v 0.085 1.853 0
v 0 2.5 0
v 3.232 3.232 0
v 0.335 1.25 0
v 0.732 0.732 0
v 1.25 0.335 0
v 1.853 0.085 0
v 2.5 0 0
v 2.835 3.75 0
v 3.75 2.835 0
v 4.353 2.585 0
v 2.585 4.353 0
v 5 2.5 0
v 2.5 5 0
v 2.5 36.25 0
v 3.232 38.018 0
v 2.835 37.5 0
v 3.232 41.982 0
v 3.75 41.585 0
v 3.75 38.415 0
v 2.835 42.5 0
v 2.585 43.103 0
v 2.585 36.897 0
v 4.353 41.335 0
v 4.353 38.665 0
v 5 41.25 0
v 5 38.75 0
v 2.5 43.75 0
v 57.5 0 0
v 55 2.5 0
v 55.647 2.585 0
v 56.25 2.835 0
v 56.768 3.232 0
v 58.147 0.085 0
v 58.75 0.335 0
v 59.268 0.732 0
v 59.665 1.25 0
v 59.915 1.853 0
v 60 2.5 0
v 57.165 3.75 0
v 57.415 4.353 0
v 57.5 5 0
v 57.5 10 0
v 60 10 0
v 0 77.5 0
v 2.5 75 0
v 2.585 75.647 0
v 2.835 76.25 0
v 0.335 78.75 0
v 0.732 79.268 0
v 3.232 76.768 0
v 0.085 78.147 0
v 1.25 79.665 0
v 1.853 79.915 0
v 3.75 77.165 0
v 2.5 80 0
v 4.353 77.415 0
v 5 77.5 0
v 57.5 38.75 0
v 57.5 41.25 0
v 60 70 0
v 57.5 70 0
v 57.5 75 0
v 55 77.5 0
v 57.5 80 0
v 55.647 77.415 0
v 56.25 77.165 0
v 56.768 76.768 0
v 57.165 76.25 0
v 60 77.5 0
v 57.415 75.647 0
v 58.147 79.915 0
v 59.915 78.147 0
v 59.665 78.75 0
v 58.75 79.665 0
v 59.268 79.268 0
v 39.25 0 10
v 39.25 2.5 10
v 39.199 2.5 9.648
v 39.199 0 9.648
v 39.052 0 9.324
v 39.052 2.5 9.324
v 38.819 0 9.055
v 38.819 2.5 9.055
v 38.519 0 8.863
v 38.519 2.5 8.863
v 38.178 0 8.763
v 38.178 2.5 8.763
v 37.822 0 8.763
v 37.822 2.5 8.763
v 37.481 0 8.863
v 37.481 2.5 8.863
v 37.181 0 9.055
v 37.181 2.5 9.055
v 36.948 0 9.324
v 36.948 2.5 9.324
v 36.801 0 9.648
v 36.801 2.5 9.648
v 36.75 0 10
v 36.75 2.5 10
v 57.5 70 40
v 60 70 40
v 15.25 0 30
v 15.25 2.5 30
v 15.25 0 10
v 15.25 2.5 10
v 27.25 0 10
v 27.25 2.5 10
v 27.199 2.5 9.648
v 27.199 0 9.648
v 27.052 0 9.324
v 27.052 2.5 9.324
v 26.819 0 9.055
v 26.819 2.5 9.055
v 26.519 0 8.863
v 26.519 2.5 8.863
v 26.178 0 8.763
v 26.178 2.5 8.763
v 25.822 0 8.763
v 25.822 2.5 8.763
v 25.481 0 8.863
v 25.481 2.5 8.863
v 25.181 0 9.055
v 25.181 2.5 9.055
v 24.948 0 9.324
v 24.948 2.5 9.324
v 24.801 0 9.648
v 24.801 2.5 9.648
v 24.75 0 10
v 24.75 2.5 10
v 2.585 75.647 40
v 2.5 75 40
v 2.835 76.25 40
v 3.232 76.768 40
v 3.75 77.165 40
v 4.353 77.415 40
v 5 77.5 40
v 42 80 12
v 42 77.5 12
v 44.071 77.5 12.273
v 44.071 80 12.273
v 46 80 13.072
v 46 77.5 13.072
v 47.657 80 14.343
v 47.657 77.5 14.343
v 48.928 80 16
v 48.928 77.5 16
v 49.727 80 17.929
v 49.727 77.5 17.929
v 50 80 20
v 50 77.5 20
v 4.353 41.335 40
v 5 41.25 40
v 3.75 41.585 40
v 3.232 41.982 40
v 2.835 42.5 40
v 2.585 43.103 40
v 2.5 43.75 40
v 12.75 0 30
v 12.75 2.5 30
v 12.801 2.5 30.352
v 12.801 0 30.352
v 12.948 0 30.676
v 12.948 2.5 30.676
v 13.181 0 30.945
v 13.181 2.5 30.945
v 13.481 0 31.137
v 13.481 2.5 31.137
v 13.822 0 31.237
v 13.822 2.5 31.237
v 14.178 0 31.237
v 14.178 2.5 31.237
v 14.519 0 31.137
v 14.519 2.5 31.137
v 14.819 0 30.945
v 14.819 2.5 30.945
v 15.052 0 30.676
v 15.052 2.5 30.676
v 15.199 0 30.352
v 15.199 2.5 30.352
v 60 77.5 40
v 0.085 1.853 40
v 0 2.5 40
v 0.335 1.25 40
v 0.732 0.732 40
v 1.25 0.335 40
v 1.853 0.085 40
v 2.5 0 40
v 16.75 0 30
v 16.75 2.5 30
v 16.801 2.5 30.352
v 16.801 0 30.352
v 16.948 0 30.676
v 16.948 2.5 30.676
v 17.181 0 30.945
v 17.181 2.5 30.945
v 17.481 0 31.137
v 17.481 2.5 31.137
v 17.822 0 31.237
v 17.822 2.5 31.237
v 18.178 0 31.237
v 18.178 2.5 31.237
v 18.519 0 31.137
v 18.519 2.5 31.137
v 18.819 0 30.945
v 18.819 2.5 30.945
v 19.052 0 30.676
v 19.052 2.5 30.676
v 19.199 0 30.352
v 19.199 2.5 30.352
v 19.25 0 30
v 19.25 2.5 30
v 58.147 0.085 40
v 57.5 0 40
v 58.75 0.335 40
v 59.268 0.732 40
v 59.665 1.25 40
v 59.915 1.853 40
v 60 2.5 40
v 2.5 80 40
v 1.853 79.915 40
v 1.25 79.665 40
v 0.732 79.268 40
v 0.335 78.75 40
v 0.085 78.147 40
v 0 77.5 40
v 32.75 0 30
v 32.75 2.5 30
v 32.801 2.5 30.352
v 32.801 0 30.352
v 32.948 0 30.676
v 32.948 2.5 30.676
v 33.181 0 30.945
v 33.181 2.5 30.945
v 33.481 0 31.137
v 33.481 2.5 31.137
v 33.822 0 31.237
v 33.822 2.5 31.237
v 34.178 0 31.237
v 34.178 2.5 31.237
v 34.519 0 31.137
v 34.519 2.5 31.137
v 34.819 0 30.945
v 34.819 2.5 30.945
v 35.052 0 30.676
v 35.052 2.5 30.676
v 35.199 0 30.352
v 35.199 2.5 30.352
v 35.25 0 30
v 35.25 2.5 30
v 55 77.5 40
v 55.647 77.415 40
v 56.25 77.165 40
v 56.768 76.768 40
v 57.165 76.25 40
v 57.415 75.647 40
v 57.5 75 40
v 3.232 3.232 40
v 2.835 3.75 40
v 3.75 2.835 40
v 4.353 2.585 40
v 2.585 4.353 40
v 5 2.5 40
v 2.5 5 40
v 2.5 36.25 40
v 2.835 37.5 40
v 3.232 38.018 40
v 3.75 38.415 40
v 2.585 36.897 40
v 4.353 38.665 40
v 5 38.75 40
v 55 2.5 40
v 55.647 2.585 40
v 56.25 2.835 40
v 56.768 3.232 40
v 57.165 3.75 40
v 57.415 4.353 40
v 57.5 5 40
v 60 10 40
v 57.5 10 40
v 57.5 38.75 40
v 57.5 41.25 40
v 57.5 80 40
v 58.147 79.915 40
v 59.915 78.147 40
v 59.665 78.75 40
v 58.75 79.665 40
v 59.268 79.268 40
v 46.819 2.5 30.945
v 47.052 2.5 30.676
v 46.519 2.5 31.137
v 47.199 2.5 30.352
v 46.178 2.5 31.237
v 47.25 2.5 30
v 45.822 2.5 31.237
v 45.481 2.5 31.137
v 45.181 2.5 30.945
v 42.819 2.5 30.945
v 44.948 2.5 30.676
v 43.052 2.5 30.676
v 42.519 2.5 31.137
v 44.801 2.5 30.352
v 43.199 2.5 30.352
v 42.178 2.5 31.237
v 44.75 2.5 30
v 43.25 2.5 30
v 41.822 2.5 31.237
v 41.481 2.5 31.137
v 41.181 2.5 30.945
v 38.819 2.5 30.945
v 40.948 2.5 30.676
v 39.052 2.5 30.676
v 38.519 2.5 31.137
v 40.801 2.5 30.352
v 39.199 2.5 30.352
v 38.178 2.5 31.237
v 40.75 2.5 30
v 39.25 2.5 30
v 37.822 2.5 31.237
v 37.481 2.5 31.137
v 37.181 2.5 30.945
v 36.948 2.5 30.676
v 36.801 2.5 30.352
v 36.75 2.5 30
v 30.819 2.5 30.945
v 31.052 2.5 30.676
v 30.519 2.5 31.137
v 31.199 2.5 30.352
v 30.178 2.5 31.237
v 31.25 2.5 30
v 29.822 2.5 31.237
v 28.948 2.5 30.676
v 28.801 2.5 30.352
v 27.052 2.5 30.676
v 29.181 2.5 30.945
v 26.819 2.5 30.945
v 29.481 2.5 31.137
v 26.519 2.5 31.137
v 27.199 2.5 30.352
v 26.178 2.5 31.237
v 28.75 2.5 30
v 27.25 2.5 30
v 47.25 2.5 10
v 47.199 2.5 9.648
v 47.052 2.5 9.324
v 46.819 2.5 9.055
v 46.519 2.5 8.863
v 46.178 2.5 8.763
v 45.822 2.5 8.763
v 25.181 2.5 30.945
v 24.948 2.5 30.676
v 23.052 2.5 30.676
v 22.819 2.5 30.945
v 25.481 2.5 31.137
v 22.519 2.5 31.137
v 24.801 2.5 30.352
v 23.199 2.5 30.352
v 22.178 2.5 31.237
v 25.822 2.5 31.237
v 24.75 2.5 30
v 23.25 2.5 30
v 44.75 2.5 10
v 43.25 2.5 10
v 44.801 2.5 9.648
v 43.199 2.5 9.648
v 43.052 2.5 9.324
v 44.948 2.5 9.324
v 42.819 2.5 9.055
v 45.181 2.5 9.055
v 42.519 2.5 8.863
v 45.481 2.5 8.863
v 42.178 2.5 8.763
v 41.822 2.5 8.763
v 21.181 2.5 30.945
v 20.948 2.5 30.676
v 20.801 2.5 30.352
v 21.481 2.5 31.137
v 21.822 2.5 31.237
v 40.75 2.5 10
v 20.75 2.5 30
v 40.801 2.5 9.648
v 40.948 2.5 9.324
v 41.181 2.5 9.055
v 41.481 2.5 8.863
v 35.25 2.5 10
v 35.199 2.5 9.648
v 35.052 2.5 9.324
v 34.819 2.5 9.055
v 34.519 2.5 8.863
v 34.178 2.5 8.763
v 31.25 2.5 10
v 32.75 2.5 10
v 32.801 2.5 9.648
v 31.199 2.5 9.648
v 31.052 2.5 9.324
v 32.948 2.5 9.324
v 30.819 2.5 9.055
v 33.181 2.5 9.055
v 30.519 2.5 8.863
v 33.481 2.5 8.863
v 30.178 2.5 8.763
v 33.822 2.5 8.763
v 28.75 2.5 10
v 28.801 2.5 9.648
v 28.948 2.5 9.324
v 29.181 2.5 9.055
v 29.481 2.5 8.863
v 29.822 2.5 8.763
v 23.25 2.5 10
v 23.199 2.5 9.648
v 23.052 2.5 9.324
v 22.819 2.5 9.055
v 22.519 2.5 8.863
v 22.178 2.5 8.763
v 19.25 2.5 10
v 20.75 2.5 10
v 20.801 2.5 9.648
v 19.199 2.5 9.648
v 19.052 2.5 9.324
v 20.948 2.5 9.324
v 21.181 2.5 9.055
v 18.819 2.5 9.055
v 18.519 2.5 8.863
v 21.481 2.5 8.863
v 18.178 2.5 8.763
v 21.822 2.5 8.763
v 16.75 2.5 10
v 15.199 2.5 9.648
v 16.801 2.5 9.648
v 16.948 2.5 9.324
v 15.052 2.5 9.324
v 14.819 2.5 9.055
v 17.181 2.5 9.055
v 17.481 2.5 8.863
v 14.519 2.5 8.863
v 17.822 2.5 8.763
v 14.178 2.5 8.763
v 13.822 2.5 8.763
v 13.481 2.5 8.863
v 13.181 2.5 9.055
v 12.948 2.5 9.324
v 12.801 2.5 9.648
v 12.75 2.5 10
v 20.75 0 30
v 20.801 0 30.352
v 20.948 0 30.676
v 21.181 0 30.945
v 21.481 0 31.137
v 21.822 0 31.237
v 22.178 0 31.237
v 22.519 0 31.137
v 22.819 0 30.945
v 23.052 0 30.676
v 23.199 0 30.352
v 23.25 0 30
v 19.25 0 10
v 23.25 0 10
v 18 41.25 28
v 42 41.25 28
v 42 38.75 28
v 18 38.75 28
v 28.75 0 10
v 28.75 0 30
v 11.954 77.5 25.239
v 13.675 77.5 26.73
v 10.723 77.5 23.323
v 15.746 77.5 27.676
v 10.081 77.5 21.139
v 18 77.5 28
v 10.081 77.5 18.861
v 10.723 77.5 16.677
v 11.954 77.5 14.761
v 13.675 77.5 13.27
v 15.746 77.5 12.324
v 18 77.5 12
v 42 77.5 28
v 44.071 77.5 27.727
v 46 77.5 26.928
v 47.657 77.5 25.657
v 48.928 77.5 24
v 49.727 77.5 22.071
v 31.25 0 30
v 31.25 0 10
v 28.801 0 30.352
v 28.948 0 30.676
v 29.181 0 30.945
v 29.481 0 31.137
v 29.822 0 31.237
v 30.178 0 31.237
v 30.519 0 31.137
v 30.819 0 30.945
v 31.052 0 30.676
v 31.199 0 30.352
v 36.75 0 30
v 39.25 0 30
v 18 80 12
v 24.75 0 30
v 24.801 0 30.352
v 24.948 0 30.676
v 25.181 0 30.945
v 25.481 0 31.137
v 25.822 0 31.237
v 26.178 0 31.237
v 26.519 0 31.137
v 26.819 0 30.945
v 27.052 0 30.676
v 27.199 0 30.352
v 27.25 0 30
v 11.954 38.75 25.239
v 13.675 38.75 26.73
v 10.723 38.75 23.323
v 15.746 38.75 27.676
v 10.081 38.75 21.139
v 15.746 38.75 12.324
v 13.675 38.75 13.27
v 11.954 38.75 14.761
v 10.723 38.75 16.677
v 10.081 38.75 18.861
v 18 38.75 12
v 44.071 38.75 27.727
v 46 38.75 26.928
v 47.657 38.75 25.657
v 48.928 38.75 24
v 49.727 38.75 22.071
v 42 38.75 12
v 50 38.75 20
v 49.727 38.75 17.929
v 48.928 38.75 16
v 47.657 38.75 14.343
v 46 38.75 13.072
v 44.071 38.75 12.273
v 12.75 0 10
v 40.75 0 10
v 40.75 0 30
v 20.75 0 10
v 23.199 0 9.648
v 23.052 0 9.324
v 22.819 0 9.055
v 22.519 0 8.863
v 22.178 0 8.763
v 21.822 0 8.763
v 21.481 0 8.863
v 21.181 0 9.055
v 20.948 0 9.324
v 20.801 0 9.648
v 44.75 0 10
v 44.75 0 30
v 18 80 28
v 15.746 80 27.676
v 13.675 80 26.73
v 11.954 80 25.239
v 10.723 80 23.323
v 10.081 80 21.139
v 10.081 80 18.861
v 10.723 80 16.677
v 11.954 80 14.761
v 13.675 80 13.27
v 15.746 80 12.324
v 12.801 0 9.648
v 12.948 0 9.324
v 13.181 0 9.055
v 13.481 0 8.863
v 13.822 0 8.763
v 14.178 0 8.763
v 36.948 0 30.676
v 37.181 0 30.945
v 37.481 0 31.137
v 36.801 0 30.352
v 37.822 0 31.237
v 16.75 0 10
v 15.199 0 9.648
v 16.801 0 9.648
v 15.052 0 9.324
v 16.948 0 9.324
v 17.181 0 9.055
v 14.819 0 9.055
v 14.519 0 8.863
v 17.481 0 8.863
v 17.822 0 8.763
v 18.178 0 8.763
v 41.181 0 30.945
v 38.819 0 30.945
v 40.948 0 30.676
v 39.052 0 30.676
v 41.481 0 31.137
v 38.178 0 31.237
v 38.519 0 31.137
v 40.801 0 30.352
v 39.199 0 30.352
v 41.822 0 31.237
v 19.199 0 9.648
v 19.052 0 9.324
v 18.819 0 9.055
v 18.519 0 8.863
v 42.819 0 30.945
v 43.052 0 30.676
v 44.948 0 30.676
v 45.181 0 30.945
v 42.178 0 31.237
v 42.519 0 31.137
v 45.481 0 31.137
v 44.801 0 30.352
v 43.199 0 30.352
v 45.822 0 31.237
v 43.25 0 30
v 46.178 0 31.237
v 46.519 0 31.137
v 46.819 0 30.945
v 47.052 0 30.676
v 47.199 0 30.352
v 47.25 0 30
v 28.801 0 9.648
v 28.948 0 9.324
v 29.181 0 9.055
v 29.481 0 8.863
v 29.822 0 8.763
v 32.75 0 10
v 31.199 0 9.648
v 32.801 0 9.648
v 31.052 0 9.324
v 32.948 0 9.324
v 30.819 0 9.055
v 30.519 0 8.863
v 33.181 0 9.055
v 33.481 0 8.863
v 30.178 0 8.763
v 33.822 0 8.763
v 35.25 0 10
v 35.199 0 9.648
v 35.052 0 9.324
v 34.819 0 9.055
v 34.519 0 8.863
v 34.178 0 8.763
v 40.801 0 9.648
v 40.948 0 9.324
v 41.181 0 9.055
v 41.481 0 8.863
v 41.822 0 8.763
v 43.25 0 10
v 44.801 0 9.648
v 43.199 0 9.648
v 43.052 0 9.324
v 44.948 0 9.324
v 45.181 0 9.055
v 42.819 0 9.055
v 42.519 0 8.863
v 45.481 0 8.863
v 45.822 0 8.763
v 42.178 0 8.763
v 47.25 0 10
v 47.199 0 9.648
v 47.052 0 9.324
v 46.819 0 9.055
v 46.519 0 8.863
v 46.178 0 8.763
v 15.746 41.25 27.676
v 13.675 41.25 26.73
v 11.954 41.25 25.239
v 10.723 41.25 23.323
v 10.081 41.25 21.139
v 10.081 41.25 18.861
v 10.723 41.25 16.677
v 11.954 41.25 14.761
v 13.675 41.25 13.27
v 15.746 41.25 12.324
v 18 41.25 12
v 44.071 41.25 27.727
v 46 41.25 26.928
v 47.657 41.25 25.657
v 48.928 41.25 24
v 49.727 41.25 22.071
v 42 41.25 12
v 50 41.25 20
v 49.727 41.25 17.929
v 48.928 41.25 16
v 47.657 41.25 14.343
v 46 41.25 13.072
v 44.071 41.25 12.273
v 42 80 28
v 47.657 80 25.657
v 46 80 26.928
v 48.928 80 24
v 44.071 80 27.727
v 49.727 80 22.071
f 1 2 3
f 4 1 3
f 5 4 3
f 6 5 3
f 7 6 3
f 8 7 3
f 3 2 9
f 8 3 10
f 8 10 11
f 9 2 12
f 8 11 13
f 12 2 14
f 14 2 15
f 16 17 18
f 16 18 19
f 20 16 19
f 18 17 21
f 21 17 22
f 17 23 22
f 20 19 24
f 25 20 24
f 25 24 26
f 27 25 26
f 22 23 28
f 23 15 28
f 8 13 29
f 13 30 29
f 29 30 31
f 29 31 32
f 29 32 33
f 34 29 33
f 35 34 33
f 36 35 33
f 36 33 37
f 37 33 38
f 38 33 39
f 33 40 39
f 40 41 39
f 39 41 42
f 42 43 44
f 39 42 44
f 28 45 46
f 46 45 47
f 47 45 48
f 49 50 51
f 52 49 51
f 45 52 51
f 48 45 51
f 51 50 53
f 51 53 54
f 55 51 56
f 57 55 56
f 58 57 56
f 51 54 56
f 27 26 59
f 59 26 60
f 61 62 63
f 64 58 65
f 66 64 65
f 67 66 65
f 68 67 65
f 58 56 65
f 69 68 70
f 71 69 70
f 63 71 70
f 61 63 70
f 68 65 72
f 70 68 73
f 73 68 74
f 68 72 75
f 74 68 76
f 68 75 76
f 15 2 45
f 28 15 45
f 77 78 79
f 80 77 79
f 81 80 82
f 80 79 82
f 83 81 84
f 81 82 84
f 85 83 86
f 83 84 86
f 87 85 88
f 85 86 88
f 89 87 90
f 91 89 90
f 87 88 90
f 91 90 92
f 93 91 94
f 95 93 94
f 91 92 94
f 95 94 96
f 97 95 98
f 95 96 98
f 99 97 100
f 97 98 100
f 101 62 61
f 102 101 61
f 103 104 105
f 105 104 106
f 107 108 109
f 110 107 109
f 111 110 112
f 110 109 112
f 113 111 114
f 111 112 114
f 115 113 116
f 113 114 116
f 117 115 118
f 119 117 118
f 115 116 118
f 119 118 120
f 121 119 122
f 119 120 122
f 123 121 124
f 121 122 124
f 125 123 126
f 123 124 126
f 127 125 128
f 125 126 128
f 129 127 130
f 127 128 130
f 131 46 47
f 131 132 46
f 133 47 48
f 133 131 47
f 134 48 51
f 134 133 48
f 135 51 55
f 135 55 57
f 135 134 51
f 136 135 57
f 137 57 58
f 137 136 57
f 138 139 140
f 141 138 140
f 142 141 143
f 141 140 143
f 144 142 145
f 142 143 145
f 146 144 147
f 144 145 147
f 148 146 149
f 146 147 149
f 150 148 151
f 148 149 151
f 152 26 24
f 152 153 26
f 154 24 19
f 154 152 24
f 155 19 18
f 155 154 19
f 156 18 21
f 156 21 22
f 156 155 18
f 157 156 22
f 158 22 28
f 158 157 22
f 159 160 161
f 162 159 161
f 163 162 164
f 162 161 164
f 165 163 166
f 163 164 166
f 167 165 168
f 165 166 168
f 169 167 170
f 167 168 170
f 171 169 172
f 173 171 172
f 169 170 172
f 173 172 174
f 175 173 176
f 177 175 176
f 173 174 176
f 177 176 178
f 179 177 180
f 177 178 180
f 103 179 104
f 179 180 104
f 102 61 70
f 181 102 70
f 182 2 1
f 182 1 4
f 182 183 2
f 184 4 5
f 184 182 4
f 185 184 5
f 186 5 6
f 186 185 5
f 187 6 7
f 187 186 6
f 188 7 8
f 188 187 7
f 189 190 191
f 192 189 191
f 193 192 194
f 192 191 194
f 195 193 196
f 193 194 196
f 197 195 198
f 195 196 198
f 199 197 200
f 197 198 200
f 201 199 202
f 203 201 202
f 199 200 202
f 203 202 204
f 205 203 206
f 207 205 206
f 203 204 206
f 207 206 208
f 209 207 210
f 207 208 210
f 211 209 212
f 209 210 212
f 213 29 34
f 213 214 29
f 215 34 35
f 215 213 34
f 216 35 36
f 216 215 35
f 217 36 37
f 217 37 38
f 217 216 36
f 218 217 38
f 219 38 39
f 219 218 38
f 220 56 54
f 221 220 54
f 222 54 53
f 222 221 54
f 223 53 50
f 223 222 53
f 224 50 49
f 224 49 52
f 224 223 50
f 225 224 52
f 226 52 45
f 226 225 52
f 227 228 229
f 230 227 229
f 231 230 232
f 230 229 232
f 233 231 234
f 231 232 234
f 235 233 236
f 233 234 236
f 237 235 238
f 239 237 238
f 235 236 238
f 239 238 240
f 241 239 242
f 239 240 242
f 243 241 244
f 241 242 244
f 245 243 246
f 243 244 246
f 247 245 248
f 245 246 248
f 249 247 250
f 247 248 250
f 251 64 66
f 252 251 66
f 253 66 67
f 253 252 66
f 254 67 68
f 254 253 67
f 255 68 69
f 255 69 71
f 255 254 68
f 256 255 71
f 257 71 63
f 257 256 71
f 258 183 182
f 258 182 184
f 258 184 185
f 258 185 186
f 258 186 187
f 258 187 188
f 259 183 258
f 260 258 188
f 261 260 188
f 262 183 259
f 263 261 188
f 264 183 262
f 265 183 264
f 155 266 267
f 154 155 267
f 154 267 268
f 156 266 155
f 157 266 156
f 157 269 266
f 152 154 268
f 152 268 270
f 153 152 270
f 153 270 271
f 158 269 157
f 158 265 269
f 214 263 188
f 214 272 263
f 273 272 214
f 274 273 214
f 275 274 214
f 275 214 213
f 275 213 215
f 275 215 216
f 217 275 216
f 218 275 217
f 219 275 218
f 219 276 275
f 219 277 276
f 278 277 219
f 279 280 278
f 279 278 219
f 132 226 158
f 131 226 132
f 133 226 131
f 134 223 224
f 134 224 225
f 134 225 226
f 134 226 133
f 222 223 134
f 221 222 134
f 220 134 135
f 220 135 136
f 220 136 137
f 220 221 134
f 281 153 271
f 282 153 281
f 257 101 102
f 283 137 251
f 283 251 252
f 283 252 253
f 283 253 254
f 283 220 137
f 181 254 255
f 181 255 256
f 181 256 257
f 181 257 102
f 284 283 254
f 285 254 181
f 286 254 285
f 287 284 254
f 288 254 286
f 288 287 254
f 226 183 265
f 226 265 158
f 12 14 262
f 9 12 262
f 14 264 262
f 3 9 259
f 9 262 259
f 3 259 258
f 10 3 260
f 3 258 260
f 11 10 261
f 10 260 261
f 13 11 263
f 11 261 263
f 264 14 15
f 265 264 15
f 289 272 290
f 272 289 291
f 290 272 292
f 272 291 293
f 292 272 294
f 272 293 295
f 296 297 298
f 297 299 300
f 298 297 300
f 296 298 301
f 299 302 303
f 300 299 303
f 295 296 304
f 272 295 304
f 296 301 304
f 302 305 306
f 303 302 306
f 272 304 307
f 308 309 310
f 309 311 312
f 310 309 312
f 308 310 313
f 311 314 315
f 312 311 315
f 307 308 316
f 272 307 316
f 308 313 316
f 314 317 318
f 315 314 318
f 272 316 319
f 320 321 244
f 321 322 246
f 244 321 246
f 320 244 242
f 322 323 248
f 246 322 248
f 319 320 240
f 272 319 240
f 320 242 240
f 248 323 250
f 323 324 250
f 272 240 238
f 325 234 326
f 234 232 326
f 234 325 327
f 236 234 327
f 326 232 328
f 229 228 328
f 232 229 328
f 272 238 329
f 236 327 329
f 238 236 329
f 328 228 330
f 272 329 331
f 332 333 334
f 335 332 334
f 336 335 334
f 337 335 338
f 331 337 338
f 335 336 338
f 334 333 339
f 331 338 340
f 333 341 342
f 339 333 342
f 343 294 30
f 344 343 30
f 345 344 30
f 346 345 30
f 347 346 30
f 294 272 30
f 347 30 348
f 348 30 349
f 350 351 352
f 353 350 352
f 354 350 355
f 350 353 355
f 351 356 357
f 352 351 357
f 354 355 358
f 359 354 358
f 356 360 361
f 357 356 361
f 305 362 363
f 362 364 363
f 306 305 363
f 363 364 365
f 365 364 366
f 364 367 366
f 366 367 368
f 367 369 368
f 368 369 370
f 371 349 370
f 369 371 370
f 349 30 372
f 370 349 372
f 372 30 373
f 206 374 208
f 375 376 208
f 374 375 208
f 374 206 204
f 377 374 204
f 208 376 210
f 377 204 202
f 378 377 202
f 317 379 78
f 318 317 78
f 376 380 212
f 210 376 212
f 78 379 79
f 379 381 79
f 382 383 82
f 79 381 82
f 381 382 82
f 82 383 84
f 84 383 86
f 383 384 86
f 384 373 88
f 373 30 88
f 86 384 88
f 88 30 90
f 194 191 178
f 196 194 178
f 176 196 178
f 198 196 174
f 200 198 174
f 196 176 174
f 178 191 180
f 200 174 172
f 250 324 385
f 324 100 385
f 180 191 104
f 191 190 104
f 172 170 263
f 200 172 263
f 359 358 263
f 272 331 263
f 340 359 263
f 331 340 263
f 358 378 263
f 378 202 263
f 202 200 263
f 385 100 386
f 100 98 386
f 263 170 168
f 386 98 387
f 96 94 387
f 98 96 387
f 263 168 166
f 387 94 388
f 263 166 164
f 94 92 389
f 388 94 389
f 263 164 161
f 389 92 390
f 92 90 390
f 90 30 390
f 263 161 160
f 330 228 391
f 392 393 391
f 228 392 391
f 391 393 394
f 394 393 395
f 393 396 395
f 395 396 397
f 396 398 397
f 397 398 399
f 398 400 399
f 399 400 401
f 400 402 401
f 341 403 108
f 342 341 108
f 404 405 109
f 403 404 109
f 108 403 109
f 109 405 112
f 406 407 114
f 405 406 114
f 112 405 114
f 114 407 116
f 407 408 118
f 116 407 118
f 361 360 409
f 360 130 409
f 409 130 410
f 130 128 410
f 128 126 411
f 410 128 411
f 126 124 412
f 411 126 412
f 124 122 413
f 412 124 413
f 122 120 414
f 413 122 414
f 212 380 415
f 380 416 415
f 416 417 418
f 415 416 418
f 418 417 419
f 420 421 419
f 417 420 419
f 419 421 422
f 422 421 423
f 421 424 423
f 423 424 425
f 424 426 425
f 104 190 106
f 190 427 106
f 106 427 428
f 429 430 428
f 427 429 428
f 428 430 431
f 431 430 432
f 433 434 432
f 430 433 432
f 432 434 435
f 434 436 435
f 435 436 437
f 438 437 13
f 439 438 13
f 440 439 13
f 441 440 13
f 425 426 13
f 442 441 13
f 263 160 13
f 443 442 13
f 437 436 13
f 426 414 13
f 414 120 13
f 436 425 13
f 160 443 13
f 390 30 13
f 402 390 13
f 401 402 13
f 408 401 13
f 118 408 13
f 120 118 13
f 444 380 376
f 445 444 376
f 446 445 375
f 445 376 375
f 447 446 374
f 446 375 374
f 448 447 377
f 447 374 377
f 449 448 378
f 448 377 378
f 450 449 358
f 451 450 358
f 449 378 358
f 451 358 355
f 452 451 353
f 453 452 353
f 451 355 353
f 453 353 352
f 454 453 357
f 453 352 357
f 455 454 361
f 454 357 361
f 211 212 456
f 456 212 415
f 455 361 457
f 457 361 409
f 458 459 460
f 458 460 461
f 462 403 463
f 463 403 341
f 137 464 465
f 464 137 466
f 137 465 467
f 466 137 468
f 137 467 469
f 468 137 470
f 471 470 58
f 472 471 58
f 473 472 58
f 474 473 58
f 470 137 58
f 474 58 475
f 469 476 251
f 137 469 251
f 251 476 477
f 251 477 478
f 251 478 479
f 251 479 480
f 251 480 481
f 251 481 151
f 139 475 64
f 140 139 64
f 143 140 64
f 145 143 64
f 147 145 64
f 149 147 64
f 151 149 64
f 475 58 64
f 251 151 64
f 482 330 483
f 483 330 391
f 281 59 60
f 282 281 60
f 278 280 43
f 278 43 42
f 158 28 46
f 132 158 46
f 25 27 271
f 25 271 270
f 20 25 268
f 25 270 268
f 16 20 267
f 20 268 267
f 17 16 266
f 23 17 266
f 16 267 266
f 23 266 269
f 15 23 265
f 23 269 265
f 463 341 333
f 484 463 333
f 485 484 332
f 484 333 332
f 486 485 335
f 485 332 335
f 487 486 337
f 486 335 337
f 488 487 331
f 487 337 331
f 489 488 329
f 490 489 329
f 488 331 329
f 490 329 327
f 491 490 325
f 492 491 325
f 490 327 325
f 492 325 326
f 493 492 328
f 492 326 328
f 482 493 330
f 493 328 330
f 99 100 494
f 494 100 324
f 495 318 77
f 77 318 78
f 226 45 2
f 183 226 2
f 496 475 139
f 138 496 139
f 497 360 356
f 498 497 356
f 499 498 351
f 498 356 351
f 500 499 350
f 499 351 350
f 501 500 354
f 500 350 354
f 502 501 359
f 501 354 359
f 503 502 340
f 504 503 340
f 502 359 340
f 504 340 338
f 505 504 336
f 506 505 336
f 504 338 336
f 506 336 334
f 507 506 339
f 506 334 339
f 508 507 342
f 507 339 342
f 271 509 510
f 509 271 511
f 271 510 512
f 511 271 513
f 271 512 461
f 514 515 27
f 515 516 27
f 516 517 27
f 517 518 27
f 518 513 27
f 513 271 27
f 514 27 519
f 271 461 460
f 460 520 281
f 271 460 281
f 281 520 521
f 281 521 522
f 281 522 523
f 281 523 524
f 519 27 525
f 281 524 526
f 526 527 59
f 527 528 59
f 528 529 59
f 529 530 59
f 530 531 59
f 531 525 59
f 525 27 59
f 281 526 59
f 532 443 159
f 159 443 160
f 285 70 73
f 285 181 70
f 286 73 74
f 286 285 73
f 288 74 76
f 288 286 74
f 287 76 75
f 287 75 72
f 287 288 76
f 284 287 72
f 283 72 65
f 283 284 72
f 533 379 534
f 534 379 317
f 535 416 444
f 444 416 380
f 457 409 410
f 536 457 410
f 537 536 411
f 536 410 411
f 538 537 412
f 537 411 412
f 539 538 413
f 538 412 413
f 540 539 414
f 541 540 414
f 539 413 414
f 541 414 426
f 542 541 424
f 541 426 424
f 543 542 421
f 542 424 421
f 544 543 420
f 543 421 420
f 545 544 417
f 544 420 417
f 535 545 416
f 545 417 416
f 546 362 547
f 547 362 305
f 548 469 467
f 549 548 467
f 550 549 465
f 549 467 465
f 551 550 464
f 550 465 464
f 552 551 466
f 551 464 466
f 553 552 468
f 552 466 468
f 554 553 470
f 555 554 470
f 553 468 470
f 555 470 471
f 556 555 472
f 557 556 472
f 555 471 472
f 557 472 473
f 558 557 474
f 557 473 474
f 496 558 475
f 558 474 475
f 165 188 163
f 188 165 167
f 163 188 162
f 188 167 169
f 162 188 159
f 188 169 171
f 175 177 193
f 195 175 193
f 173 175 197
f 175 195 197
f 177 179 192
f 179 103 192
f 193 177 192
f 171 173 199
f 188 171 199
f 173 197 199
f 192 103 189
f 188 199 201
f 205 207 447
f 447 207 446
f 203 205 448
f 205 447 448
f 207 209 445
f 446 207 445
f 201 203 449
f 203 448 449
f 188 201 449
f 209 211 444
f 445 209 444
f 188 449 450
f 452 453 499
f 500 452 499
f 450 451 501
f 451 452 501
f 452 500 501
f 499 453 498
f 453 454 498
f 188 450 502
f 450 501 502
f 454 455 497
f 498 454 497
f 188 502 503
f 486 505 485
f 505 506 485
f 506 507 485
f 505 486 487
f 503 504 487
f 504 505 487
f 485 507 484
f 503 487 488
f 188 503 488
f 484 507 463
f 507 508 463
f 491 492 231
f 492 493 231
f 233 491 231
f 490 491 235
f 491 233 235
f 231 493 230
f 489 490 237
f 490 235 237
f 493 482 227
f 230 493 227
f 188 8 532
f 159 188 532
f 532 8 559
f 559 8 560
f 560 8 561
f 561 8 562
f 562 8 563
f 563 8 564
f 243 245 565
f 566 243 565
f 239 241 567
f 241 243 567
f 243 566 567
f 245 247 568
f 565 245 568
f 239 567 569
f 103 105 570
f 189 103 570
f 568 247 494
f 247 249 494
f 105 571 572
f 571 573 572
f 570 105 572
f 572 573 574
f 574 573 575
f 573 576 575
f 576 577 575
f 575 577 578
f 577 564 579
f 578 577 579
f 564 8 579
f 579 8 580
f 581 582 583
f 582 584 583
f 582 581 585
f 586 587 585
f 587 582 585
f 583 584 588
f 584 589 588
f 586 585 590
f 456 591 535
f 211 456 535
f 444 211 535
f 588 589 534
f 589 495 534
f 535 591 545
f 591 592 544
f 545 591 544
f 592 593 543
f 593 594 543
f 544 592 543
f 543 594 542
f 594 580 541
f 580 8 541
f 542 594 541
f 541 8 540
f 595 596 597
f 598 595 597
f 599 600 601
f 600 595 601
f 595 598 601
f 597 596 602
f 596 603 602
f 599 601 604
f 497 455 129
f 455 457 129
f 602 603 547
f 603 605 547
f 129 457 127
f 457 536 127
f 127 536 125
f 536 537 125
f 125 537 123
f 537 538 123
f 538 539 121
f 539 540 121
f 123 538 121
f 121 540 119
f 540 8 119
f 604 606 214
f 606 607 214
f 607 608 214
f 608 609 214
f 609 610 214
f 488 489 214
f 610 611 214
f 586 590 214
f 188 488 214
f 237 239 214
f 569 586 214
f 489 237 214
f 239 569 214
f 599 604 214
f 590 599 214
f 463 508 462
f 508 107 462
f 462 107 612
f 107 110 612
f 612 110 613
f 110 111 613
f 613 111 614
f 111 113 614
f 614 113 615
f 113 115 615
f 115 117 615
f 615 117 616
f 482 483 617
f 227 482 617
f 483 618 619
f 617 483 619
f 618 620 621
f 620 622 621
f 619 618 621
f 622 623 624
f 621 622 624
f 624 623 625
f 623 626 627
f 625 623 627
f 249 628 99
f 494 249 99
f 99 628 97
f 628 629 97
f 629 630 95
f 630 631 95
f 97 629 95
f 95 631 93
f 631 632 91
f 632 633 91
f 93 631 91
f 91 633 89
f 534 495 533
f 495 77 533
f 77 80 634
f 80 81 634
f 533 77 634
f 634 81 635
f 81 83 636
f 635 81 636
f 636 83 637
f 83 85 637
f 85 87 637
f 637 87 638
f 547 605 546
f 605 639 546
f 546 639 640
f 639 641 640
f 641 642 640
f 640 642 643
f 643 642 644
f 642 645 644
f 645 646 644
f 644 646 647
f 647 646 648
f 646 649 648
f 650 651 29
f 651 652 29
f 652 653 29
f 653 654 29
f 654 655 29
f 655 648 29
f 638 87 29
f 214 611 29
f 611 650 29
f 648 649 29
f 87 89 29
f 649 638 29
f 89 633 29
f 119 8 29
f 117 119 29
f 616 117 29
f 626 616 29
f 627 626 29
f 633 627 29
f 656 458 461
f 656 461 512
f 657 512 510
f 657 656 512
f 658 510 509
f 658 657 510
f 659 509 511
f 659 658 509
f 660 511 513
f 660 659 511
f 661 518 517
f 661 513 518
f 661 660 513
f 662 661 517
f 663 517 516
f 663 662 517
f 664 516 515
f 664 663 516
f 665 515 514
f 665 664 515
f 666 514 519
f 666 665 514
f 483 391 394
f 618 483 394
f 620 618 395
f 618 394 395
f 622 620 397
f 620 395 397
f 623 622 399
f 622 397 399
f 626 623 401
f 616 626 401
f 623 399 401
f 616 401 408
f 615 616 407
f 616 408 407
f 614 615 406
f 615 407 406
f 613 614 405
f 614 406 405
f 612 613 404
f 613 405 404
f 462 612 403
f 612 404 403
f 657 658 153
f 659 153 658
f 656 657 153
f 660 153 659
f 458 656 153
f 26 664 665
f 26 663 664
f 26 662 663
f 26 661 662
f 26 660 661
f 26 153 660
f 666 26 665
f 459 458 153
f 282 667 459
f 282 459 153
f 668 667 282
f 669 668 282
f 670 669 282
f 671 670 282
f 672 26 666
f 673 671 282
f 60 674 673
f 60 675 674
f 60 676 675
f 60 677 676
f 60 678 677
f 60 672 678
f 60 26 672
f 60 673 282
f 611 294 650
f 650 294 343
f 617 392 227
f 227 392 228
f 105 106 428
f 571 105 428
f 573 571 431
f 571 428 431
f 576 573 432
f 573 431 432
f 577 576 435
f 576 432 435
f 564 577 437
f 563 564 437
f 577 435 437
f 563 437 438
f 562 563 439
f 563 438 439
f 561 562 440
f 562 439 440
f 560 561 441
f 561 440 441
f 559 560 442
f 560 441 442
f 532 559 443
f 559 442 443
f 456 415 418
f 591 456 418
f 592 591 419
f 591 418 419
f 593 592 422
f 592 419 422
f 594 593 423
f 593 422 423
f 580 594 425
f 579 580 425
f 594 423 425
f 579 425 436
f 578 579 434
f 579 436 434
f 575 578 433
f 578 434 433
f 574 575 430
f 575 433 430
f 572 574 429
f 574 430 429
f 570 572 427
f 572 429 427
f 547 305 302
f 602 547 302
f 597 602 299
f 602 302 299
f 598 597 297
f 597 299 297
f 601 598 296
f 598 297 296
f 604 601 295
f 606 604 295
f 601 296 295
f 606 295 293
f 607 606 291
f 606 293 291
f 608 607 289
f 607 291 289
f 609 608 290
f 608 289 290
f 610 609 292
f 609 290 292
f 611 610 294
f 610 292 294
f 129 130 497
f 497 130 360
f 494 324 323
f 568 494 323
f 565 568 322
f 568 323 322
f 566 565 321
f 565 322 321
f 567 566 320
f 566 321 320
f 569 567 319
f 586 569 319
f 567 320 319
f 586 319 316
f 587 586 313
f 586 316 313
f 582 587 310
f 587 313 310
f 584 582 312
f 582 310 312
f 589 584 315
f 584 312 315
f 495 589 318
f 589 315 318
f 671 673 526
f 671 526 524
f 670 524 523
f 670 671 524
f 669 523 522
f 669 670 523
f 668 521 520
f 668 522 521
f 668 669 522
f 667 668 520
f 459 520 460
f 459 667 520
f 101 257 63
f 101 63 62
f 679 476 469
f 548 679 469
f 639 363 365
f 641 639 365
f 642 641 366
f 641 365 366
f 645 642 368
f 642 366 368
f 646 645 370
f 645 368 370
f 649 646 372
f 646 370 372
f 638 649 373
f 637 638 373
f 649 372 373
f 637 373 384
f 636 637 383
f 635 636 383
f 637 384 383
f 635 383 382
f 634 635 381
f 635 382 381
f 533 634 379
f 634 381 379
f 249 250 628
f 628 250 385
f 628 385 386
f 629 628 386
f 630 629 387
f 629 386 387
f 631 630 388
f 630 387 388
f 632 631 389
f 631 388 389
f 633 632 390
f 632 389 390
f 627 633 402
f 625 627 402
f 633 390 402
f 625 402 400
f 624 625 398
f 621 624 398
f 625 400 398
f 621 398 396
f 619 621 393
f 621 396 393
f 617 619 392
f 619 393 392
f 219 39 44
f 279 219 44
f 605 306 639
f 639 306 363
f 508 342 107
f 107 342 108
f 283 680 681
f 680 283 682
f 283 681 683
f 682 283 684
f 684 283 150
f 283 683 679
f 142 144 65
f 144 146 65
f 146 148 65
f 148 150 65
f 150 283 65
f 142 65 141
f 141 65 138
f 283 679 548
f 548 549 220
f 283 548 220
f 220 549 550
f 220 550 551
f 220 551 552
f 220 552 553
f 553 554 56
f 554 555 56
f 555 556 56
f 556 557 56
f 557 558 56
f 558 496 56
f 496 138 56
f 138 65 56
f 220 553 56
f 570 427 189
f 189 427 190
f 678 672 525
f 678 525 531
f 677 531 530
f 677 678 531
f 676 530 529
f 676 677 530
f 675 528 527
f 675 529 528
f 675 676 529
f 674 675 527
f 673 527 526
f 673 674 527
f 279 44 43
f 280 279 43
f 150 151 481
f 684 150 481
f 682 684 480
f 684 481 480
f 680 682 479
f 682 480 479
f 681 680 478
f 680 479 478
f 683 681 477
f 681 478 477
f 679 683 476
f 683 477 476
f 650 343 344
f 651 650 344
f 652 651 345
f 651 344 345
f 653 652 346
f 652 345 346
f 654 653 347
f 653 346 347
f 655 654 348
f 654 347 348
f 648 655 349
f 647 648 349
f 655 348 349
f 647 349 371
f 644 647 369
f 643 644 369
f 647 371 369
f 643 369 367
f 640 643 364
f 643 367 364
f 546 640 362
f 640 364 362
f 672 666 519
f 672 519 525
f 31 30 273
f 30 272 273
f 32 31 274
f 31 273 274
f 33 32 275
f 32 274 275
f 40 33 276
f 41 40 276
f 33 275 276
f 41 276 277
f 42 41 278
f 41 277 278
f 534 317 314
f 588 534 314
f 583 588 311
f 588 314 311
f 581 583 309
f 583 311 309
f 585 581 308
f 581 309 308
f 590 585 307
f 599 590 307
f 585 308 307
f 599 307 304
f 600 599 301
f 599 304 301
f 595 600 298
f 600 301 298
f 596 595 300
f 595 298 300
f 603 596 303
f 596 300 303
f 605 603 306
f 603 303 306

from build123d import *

# Parameters (mm, degrees)
F2_W          = 55
F2_H          = 2.5
F4_DEPTH      = 40
F6_DEPTH      = 2.501
F6_DEPTH_BACK = 75
F8_DEPTH      = 2.501
F9_R          = 2.5


with BuildPart() as f4:
    # F2 (on Top) → F4 (new body)
    with BuildSketch(Plane.XY):
        with Locations((30, 40)):
            Rectangle(F2_W, F2_H)
        Polygon((0, 80), (0, 0), (60, 0), (60, 10), (57.5, 10), (57.5, 2.5), (2.5, 2.5), (2.5, 38.75), (2.5, 41.25), (2.5, 77.5), (57.5, 77.5), (57.5, 70), (60, 70), (60, 80), align=None)
    extrude(amount=F4_DEPTH)

    # F5 (on face) → F6 (cut, two sides)
    with BuildSketch(Plane.XZ.offset(-77.5)) as f6_sk:
        with BuildLine():
            ThreePointArc((18, 12), (23.6568542495, 14.3431457505), (26, 20))
            ThreePointArc((26, 20), (23.6568542495, 25.6568542495), (18, 28))
            ThreePointArc((18, 28), (10, 20), (18, 12))
        make_face()
        with BuildLine():
            ThreePointArc((18, 28), (23.6568542495, 25.6568542495), (26, 20))
            ThreePointArc((26, 20), (23.6568542495, 14.3431457505), (18, 12))
            Line((18, 12), (42, 12))
            ThreePointArc((42, 12), (34, 20), (42, 28))
            Line((42, 28), (18, 28))
        make_face()
        with BuildLine():
            ThreePointArc((50, 20), (47.6568542495, 25.6568542495), (42, 28))
            ThreePointArc((42, 28), (34, 20), (42, 12))
            ThreePointArc((42, 12), (47.6568542495, 14.3431457505), (50, 20))
        make_face()
    extrude(amount=-F6_DEPTH, mode=Mode.SUBTRACT)
    extrude(f6_sk.sketch, amount=F6_DEPTH_BACK, mode=Mode.SUBTRACT)

    # F7 (on face) → F8 (cut, through all)
    with BuildSketch(Plane(origin=(0, 2.5, 0), x_dir=(-1, 0, 0), z_dir=(0, 1, 0))):
        with BuildLine():
            ThreePointArc((-15.25, 30), (-14, 28.75), (-12.75, 30))
            ThreePointArc((-12.75, 30), (-14, 31.25), (-15.25, 30))
        make_face()
        with BuildLine():
            ThreePointArc((-15.25, 10), (-14, 11.25), (-12.75, 10))
            Line((-12.75, 10), (-12.75, 30))
            ThreePointArc((-12.75, 30), (-14, 28.75), (-15.25, 30))
            Line((-15.25, 30), (-15.25, 10))
        make_face()
        with BuildLine():
            ThreePointArc((-15.25, 10), (-14, 8.75), (-12.75, 10))
            ThreePointArc((-12.75, 10), (-14, 11.25), (-15.25, 10))
        make_face()
        with BuildLine():
            ThreePointArc((-19.25, 10), (-18, 8.75), (-16.75, 10))
            ThreePointArc((-16.75, 10), (-18, 11.25), (-19.25, 10))
        make_face()
        with BuildLine():
            ThreePointArc((-19.25, 10), (-18, 11.25), (-16.75, 10))
            Line((-16.75, 10), (-16.75, 30))
            ThreePointArc((-16.75, 30), (-18, 28.75), (-19.25, 30))
            Line((-19.25, 30), (-19.25, 10))
        make_face()
        with BuildLine():
            ThreePointArc((-19.25, 30), (-18, 28.75), (-16.75, 30))
            ThreePointArc((-16.75, 30), (-18, 31.25), (-19.25, 30))
        make_face()
        with BuildLine():
            ThreePointArc((-23.25, 30), (-22, 28.75), (-20.75, 30))
            ThreePointArc((-20.75, 30), (-22, 31.25), (-23.25, 30))
        make_face()
        with BuildLine():
            ThreePointArc((-23.25, 10), (-22, 11.25), (-20.75, 10))
            Line((-20.75, 10), (-20.75, 30))
            ThreePointArc((-20.75, 30), (-22, 28.75), (-23.25, 30))
            Line((-23.25, 30), (-23.25, 10))
        make_face()
        with BuildLine():
            ThreePointArc((-23.25, 10), (-22, 8.75), (-20.75, 10))
            ThreePointArc((-20.75, 10), (-22, 11.25), (-23.25, 10))
        make_face()
        with BuildLine():
            ThreePointArc((-27.25, 10), (-26, 8.75), (-24.75, 10))
            ThreePointArc((-24.75, 10), (-26, 11.25), (-27.25, 10))
        make_face()
        with BuildLine():
            ThreePointArc((-27.25, 30), (-26, 28.75), (-24.75, 30))
            ThreePointArc((-24.75, 30), (-26, 31.25), (-27.25, 30))
        make_face()
        with BuildLine():
            ThreePointArc((-31.25, 30), (-30, 28.75), (-28.75, 30))
            ThreePointArc((-28.75, 30), (-30, 31.25), (-31.25, 30))
        make_face()
        with BuildLine():
            Line((-28.75, 10), (-28.75, 30))
            ThreePointArc((-28.75, 30), (-30, 28.75), (-31.25, 30))
            Line((-31.25, 30), (-31.25, 10))
            ThreePointArc((-31.25, 10), (-30, 11.25), (-28.75, 10))
        make_face()
        with BuildLine():
            ThreePointArc((-31.25, 10), (-30, 8.75), (-28.75, 10))
            ThreePointArc((-28.75, 10), (-30, 11.25), (-31.25, 10))
        make_face()
        with BuildLine():
            ThreePointArc((-27.25, 10), (-26, 11.25), (-24.75, 10))
            Line((-24.75, 10), (-24.75, 30))
            ThreePointArc((-24.75, 30), (-26, 28.75), (-27.25, 30))
            Line((-27.25, 30), (-27.25, 10))
        make_face()
        with BuildLine():
            ThreePointArc((-32.75, 10), (-34, 11.25), (-35.25, 10))
            ThreePointArc((-35.25, 10), (-34, 8.75), (-32.75, 10))
        make_face()
        with BuildLine():
            ThreePointArc((-32.75, 30), (-34, 28.75), (-35.25, 30))
            Line((-35.25, 30), (-35.25, 10))
            ThreePointArc((-35.25, 10), (-34, 11.25), (-32.75, 10))
            Line((-32.75, 10), (-32.75, 30))
        make_face()
        with BuildLine():
            ThreePointArc((-32.75, 30), (-34, 31.25), (-35.25, 30))
            ThreePointArc((-35.25, 30), (-34, 28.75), (-32.75, 30))
        make_face()
        with BuildLine():
            ThreePointArc((-36.75, 30), (-38, 31.25), (-39.25, 30))
            ThreePointArc((-39.25, 30), (-38, 28.75), (-36.75, 30))
        make_face()
        with BuildLine():
            ThreePointArc((-36.75, 30), (-38, 28.75), (-39.25, 30))
            Line((-39.25, 30), (-39.25, 10))
            ThreePointArc((-39.25, 10), (-38, 11.25), (-36.75, 10))
            Line((-36.75, 10), (-36.75, 30))
        make_face()
        with BuildLine():
            ThreePointArc((-36.75, 10), (-38, 11.25), (-39.25, 10))
            ThreePointArc((-39.25, 10), (-38, 8.75), (-36.75, 10))
        make_face()
        with BuildLine():
            ThreePointArc((-40.75, 10), (-42, 11.25), (-43.25, 10))
            ThreePointArc((-43.25, 10), (-42, 8.75), (-40.75, 10))
        make_face()
        with BuildLine():
            ThreePointArc((-40.75, 30), (-42, 28.75), (-43.25, 30))
            Line((-43.25, 30), (-43.25, 10))
            ThreePointArc((-43.25, 10), (-42, 11.25), (-40.75, 10))
            Line((-40.75, 10), (-40.75, 30))
        make_face()
        with BuildLine():
            ThreePointArc((-40.75, 30), (-42, 31.25), (-43.25, 30))
            ThreePointArc((-43.25, 30), (-42, 28.75), (-40.75, 30))
        make_face()
        with BuildLine():
            ThreePointArc((-44.75, 30), (-46, 31.25), (-47.25, 30))
            ThreePointArc((-47.25, 30), (-46, 28.75), (-44.75, 30))
        make_face()
        with BuildLine():
            ThreePointArc((-44.75, 30), (-46, 28.75), (-47.25, 30))
            Line((-47.25, 30), (-47.25, 10))
            ThreePointArc((-47.25, 10), (-46, 11.25), (-44.75, 10))
            Line((-44.75, 10), (-44.75, 30))
        make_face()
        with BuildLine():
            ThreePointArc((-44.75, 10), (-46, 11.25), (-47.25, 10))
            ThreePointArc((-47.25, 10), (-46, 8.75), (-44.75, 10))
        make_face()
    extrude(amount=-F8_DEPTH, mode=Mode.SUBTRACT)

    # F9
    f9_edges = [f4.edges().sort_by_distance(p)[0] for p in [
        (2.5, 41.25, 20),
        (2.5, 38.75, 20),
        (2.5, 77.5, 20),
        (60, 80, 20),
        (57.5, 77.5, 20),
        (0, 80, 20),
        (2.5, 2.5, 20),
        (57.5, 2.5, 20),
        (0, 0, 20),
        (60, 0, 20),
    ]]
    fillet(f9_edges, radius=F9_R)


solid = f4.part
